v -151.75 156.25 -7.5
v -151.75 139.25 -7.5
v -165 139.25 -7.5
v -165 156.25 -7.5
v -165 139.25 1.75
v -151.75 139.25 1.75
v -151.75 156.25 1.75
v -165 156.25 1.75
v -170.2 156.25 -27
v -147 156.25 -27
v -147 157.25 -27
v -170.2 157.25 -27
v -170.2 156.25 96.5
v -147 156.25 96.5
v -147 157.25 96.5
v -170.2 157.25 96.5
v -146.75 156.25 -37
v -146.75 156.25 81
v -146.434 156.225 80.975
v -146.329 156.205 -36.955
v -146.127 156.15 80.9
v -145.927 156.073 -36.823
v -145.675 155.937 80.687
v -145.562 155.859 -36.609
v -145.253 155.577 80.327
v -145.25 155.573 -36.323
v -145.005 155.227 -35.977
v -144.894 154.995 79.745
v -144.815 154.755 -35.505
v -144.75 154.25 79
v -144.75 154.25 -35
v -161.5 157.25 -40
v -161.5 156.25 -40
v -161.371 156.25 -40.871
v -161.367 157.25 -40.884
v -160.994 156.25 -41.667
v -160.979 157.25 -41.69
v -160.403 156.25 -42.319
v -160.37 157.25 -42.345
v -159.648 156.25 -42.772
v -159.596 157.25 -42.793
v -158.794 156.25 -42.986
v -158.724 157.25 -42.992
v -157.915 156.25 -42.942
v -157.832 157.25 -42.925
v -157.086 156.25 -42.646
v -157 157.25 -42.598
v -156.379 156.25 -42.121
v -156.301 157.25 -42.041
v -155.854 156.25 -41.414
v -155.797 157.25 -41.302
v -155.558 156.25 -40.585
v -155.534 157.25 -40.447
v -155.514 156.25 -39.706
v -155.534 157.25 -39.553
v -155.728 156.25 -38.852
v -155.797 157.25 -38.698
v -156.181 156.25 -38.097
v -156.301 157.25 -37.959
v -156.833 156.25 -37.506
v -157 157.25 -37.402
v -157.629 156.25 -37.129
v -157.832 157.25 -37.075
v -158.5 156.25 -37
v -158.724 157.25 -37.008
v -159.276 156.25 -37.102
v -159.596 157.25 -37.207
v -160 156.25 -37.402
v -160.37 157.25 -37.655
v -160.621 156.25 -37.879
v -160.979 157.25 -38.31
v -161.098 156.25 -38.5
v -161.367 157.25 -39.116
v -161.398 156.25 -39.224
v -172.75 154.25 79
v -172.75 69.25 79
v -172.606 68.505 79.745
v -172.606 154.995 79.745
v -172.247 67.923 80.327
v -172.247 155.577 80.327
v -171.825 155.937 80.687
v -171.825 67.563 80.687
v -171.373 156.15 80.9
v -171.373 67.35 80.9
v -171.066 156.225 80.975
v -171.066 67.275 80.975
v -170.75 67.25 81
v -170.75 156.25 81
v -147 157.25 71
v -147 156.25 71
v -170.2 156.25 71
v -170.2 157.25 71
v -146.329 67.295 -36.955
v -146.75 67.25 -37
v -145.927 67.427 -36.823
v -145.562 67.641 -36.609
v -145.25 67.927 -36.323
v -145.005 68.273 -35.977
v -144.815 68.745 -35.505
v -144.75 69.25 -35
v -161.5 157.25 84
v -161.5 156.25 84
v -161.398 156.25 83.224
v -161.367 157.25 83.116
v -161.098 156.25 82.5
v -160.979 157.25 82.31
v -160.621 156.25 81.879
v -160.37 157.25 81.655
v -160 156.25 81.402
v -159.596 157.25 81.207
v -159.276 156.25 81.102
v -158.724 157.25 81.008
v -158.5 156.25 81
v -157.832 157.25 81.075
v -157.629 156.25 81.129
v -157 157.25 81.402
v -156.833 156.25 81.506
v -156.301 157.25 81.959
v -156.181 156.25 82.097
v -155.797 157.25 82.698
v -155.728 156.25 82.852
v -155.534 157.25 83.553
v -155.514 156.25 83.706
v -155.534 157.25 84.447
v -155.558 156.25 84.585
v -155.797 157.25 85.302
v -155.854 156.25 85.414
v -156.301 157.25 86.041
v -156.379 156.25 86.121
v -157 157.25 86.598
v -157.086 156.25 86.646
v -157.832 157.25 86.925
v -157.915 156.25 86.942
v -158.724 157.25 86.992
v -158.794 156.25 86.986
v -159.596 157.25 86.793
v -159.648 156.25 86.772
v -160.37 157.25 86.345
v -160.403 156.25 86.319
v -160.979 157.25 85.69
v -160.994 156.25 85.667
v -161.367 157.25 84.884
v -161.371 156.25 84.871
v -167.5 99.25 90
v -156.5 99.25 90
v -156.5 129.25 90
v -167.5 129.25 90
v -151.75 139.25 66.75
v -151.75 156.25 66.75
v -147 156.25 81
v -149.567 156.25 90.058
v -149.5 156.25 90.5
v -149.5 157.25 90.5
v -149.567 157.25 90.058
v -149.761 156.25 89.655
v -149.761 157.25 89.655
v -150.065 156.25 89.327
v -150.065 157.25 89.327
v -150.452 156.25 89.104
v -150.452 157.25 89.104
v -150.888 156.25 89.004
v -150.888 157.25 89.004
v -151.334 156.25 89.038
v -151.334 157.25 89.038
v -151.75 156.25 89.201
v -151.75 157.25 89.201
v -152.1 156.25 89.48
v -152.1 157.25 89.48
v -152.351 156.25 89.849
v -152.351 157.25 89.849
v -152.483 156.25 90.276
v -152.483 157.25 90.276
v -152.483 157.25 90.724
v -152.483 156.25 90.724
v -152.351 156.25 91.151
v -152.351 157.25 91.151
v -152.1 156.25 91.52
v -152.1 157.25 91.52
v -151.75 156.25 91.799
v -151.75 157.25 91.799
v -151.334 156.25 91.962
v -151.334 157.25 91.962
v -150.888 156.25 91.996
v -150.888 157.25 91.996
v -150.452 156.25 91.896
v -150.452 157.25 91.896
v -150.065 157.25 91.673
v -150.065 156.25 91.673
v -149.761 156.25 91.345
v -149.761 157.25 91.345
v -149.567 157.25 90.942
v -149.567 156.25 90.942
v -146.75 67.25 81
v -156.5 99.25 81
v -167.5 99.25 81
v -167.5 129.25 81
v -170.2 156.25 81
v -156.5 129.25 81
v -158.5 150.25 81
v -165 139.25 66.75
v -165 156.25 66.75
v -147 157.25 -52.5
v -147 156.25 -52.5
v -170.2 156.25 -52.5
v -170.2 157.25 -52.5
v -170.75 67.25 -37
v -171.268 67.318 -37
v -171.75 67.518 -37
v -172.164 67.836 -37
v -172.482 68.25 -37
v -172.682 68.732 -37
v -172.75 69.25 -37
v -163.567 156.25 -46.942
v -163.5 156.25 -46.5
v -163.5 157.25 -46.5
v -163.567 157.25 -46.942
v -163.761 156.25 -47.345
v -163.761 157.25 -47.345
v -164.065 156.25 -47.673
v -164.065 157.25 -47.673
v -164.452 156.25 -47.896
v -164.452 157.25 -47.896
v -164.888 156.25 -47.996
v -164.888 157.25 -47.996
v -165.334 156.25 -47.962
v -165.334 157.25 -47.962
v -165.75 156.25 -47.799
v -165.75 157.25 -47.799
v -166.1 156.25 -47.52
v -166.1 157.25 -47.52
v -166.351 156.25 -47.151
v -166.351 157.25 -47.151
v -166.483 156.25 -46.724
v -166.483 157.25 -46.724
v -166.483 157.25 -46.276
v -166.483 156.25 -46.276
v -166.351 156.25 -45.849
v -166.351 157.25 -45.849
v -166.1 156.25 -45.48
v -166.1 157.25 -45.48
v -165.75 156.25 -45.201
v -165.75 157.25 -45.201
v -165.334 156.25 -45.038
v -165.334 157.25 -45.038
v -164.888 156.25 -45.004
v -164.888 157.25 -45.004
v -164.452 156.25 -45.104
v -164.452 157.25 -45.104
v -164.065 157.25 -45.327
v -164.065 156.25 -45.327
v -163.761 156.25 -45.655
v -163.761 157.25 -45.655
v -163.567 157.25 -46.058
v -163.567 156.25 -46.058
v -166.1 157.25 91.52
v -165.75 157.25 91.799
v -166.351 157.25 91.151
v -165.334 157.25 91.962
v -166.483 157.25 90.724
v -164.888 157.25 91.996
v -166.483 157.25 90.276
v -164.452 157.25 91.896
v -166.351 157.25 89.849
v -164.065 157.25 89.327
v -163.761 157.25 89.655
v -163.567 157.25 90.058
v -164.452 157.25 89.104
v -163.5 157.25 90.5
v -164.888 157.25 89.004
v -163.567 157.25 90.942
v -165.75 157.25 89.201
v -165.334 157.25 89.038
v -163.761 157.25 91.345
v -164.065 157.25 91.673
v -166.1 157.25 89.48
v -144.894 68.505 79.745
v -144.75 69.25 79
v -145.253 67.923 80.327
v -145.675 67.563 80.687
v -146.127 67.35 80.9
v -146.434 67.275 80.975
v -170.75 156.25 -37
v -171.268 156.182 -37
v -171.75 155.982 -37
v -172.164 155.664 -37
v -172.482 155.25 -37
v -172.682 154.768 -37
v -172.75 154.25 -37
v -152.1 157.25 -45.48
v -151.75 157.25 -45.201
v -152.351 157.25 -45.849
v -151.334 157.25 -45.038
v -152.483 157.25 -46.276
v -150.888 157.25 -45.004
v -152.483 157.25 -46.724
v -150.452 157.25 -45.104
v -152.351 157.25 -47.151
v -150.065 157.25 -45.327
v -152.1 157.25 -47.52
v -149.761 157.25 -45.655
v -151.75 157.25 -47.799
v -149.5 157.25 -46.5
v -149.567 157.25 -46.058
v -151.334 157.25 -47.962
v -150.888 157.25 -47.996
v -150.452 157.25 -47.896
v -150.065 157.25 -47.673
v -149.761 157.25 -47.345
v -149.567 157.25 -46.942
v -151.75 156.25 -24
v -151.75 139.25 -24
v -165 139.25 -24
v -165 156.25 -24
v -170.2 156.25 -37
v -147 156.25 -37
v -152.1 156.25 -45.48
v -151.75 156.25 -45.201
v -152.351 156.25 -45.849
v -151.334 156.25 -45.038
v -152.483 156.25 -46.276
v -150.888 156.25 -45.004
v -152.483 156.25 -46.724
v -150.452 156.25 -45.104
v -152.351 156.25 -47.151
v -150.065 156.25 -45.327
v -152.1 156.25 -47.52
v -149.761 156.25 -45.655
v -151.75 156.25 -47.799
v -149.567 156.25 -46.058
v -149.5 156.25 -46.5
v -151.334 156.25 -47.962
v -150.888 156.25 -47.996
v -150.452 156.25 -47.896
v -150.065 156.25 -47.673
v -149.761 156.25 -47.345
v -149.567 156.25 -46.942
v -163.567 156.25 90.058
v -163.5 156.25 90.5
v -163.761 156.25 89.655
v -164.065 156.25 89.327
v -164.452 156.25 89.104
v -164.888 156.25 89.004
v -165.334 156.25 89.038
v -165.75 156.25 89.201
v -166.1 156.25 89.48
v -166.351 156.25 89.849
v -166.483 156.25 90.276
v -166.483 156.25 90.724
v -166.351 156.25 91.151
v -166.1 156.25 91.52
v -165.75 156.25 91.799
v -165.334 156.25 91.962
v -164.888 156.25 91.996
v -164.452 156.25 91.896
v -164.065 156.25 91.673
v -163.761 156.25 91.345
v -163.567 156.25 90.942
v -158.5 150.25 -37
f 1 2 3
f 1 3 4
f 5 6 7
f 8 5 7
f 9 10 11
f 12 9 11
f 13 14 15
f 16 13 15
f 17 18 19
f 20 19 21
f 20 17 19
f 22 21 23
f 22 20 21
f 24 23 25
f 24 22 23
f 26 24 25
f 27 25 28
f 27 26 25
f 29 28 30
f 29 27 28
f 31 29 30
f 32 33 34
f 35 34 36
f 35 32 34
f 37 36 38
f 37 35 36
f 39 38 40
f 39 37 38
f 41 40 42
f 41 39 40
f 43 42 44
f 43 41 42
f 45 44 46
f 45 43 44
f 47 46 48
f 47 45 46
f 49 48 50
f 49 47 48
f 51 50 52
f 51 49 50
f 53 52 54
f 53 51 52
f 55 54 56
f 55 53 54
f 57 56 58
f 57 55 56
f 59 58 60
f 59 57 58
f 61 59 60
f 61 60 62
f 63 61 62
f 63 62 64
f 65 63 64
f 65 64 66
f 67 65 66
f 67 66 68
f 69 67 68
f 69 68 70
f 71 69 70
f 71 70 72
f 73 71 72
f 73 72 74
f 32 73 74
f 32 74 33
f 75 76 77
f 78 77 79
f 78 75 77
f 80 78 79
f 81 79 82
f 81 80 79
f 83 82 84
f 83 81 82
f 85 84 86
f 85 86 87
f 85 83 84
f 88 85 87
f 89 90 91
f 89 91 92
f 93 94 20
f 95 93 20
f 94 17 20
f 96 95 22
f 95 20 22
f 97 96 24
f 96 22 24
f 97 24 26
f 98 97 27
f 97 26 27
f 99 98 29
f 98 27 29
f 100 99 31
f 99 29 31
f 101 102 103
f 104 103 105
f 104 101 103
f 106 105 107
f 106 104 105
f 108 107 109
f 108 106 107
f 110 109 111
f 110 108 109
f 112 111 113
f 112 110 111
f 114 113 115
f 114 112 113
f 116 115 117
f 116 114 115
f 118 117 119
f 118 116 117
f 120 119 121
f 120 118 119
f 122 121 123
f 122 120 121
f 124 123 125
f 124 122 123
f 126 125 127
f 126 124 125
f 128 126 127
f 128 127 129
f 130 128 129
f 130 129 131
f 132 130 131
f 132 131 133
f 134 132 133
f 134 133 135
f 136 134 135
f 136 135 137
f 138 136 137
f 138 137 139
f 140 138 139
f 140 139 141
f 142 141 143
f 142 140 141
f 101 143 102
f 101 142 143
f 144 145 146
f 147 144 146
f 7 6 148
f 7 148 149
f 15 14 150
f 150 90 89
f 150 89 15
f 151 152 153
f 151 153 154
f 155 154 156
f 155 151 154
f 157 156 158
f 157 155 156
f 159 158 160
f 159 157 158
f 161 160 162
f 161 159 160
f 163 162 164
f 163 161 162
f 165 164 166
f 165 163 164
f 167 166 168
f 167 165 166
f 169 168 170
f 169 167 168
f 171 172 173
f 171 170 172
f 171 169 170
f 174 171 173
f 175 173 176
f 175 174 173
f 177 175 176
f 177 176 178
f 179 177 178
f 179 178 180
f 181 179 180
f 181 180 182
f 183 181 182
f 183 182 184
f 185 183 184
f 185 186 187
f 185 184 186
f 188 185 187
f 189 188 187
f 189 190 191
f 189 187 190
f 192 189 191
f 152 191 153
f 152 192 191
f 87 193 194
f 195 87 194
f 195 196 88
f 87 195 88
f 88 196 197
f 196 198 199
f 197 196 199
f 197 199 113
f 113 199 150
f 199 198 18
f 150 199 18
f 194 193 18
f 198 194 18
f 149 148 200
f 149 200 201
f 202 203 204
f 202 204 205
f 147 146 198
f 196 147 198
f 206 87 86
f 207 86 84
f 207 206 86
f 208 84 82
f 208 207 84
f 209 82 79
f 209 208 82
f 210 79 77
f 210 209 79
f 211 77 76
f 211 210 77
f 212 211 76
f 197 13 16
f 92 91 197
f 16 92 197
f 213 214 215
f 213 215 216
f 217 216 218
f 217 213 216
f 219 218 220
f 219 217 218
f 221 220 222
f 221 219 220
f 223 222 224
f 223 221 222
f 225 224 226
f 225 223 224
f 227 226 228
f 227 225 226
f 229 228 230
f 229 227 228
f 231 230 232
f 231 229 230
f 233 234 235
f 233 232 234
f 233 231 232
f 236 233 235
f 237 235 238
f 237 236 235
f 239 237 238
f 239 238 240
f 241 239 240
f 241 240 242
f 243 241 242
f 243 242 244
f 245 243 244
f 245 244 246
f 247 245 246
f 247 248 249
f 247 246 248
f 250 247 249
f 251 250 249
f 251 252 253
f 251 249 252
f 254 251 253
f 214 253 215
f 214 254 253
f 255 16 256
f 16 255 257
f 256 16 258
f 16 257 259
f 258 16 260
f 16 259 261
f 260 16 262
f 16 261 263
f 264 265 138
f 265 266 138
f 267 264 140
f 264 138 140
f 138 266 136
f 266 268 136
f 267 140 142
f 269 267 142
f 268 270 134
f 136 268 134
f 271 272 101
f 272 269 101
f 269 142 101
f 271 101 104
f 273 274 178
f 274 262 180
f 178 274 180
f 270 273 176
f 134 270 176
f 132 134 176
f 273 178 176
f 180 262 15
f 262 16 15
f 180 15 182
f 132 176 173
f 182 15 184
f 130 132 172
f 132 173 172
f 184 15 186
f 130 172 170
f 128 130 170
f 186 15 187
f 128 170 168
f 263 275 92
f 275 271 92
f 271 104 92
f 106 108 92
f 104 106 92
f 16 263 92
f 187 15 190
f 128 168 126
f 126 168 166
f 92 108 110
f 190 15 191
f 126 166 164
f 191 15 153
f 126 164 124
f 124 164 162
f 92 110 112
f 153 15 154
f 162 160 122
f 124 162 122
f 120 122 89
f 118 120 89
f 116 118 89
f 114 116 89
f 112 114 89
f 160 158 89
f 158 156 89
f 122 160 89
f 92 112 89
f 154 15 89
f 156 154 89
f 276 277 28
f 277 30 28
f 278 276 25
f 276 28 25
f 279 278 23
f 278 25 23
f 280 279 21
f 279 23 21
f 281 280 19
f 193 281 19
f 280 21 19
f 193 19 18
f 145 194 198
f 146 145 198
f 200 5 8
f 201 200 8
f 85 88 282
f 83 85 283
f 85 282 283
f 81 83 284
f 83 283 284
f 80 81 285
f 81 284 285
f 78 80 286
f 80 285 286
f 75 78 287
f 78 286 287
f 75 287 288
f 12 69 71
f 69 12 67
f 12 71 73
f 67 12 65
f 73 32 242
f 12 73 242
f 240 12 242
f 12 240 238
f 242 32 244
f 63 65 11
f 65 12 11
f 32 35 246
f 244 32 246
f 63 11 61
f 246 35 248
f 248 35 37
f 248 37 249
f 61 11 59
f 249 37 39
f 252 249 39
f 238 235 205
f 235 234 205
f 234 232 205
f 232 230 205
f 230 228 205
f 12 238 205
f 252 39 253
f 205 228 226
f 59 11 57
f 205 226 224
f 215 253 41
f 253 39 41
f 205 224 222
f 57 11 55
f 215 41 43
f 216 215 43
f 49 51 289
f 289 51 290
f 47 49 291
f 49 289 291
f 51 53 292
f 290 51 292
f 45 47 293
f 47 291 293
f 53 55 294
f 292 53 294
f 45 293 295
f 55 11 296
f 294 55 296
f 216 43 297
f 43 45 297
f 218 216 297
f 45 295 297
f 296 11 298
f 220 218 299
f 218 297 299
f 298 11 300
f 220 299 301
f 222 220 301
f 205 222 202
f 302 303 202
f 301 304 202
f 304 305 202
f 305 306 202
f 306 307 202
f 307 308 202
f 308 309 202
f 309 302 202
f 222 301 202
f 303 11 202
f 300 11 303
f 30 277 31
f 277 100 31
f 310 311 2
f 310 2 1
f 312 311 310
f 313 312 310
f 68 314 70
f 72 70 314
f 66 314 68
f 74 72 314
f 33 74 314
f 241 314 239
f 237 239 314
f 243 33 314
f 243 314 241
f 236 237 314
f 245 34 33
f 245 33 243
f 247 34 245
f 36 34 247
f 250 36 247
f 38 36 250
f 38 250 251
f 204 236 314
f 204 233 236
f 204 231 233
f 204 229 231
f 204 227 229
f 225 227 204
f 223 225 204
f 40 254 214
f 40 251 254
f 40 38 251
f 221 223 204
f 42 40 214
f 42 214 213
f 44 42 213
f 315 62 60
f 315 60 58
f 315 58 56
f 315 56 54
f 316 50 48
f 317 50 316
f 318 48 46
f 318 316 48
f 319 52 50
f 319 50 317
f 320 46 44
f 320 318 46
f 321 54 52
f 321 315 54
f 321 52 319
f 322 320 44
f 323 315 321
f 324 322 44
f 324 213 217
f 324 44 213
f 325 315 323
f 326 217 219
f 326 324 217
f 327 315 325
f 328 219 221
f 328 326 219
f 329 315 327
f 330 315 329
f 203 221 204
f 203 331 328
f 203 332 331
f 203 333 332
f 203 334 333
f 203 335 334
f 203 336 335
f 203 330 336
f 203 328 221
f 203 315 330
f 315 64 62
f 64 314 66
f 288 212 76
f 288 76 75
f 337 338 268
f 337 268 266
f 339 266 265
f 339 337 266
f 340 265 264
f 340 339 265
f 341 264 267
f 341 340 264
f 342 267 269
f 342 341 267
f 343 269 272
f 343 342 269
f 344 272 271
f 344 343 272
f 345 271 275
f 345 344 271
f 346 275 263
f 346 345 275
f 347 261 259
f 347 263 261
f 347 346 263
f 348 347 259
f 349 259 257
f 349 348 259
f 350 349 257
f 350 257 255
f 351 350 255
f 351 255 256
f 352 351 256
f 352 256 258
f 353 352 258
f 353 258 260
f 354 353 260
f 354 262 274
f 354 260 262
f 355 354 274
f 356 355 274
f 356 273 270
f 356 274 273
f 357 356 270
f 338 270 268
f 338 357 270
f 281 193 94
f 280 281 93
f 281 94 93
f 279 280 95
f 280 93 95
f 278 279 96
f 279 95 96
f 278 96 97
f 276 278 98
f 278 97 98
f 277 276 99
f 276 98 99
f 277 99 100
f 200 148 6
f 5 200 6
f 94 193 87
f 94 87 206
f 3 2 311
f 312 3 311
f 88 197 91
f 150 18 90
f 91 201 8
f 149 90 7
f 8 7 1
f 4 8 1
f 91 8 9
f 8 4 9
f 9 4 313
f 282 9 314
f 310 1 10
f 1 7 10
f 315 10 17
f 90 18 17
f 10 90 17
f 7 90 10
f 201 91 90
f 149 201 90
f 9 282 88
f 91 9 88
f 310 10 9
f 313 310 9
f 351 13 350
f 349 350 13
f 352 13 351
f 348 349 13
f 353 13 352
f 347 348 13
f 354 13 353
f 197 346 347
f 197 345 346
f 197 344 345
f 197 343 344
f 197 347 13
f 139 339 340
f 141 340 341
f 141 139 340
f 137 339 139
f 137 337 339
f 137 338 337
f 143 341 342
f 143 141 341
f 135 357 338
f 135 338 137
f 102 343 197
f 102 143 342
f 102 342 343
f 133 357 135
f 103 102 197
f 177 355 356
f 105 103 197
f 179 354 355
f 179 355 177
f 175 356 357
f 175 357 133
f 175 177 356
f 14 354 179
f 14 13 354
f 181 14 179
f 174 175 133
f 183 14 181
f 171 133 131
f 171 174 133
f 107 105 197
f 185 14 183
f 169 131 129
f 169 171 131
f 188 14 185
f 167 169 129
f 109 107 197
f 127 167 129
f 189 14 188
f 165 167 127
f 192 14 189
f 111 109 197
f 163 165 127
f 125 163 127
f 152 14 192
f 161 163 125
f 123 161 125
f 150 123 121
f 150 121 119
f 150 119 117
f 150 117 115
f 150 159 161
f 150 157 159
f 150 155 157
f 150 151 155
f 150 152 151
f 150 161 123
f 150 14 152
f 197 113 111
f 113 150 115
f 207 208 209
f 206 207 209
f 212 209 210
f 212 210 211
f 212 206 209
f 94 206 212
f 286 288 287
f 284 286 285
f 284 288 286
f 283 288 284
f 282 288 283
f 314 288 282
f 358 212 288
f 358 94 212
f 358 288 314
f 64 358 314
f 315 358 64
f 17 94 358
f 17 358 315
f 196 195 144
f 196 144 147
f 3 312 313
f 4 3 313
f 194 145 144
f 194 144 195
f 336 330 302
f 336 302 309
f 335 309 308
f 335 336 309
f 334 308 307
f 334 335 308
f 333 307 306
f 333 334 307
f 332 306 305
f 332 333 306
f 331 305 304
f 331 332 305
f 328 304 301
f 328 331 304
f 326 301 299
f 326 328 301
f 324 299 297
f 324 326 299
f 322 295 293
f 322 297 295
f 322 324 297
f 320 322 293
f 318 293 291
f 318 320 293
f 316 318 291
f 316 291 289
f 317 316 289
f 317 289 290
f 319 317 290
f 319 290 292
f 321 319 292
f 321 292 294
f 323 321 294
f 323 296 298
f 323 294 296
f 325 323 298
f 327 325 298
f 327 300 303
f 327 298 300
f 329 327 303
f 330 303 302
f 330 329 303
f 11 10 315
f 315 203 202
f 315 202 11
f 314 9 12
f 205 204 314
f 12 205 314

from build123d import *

# Parameters (mm, degrees)
CYLINDER030_R             = 1.5
CYLINDER030_DEPTH         = 10
CYLINDER031_R             = 1.5
CYLINDER031_DEPTH         = 10
CYLINDER032_R             = 1.5
CYLINDER032_DEPTH         = 10
CYLINDER029_R             = 1.5
CYLINDER029_DEPTH         = 10
CYLINDER028_R             = 3
CYLINDER028_DEPTH         = 10
CYLINDER027_R             = 3
CYLINDER027_DEPTH         = 10
BOX036_W                  = 30
BOX036_H                  = 9
BOX036_DEPTH              = 11
BOX037_W                  = 1
BOX037_H                  = 25.5
BOX037_DEPTH              = 23.2
BOX038_W                  = 1
BOX038_H                  = 25.5
BOX038_DEPTH              = 23.2
BOX002_W                  = 17
BOX002_H                  = 16.5
BOX002_DEPTH              = 13.25
BOX035_W                  = 17
BOX035_H                  = 65
BOX035_DEPTH              = 13.25
BOX034_W                  = 89
BOX034_H                  = 118
BOX034_DEPTH              = 28
FILLET022_R               = 2
FILLET022_ROLL_ANGLE      = -90
FILLET022_PLACEMENT_ANGLE = 90


with BuildPart() as cylinder030:
    # Cylinder030 → Cylinder030 (new body)
    with BuildSketch(Plane(origin=(85, -9.5, 20.25), x_dir=(0, 0, -1), z_dir=(1, 0, 0))):
        Circle(CYLINDER030_R)
    extrude(amount=CYLINDER030_DEPTH)


with BuildPart() as cylinder031:
    # Cylinder031 → Cylinder031 (new body)
    with BuildSketch(Plane(origin=(85, 127.5, 6.25), x_dir=(0, 0, -1), z_dir=(1, 0, 0))):
        Circle(CYLINDER031_R)
    extrude(amount=CYLINDER031_DEPTH)


with BuildPart() as cylinder032:
    # Cylinder032 → Cylinder032 (new body)
    with BuildSketch(Plane(origin=(85, 127.5, 20.25), x_dir=(0, 0, -1), z_dir=(1, 0, 0))):
        Circle(CYLINDER032_R)
    extrude(amount=CYLINDER032_DEPTH)


with BuildPart() as mount_small_cyl:
    # Cylinder029 → Cylinder029 (new body)
    with BuildSketch(Plane(origin=(85, -9.5, 6.25), x_dir=(0, 0, -1), z_dir=(1, 0, 0))):
        Circle(CYLINDER029_R)
    extrude(amount=CYLINDER029_DEPTH)

    # Fusion021: union Cylinder030, Cylinder031, Cylinder032
    add(cylinder030.part)
    add(cylinder031.part)
    add(cylinder032.part)


with BuildPart() as cylinder028:
    # Cylinder028 → Cylinder028 (new body)
    with BuildSketch(Plane(origin=(93, 121, 4.5), x_dir=(0, 0, 1), z_dir=(-1, 0, 0))):
        Circle(CYLINDER028_R)
    extrude(amount=CYLINDER028_DEPTH)


with BuildPart() as mount_cyl:
    # Cylinder027 → Cylinder027 (new body)
    with BuildSketch(Plane(origin=(93, -3, 4.5), x_dir=(0, 0, 1), z_dir=(-1, 0, 0))):
        Circle(CYLINDER027_R)
    extrude(amount=CYLINDER027_DEPTH)

    # Fusion020: union Cylinder028
    add(cylinder028.part)


with BuildPart() as mount_cyl_1:
    # Fusion020 placement: moved
    add(mount_cyl.part.moved(Location((0, 0, 9.25))))


with BuildPart() as power:
    # Box036 → Box036 (new body)
    with BuildSketch(Plane(origin=(32, -9, 11.75), x_dir=(1, 0, 0), z_dir=(0, 0, 1))):
        with Locations((15, 4.5)):
            Rectangle(BOX036_W, BOX036_H)
    extrude(amount=BOX036_DEPTH)


with BuildPart() as mount1:
    # Box037 → Box037 (new body)
    with BuildSketch(Plane(origin=(89, -15.5, 2.25), x_dir=(1, 0, 0), z_dir=(0, 0, 1))):
        with Locations((0.5, 12.75)):
            Rectangle(BOX037_W, BOX037_H)
    extrude(amount=BOX037_DEPTH)


with BuildPart() as mount2:
    # Box038 → Box038 (new body)
    with BuildSketch(Plane(origin=(89, 108, 2.25), x_dir=(1, 0, 0), z_dir=(0, 0, 1))):
        with Locations((0.5, 12.75)):
            Rectangle(BOX038_W, BOX038_H)
    extrude(amount=BOX038_DEPTH)


with BuildPart() as cube020:
    # Box002 → Box002 (new body)
    with BuildSketch(Plane(origin=(72, 88.5, 7), x_dir=(1, 0, 0), z_dir=(0, 0, 1))):
        with Locations((8.5, 8.25)):
            Rectangle(BOX002_W, BOX002_H)
    extrude(amount=BOX002_DEPTH)


with BuildPart() as cube019:
    # Box035 → Box035 (new body)
    with BuildSketch(Plane(origin=(72, 14.25, 7), x_dir=(1, 0, 0), z_dir=(0, 0, 1))):
        with Locations((8.5, 32.5)):
            Rectangle(BOX035_W, BOX035_H)
    extrude(amount=BOX035_DEPTH)


with BuildPart() as switch:
    # Box034 → Box034 (new body)
    with BuildSketch(Plane.XY):
        with Locations((44.5, 59)):
            Rectangle(BOX034_W, BOX034_H)
    extrude(amount=BOX034_DEPTH)

    # Cut023: cut Cube019
    add(cube019.part, mode=Mode.SUBTRACT)

    # Cut024: cut Cube020
    add(cube020.part, mode=Mode.SUBTRACT)

    # Fusion019: union Power, mount1, mount2
    add(power.part)
    add(mount1.part)
    add(mount2.part)

    # Cut025: cut mount_cyl
    add(mount_cyl_1.part, mode=Mode.SUBTRACT)

    # Cut026: cut mount_small_cyl
    add(mount_small_cyl.part, mode=Mode.SUBTRACT)

    # Fillet022
    fillet022_edges = [switch.edges().sort_by_distance(p)[0] for p in [
        (44.5, 0, 0),
        (44.5, 0, 28),
        (0, 59, 0),
        (44.5, 118, 0),
        (89, 59, 0),
        (89, 59, 28),
        (0, 59, 28),
    ]]
    fillet(fillet022_edges, radius=FILLET022_R)


with BuildPart() as switch_1:
    # Fillet022 roll: moved
    add(switch.part.rotate(Axis((0, 0, 0), (1, 0, 0)), FILLET022_ROLL_ANGLE))


with BuildPart() as switch_2:
    # Fillet022 placement: moved
    add(switch_1.part.moved(Location((-144.75, 67.25, 81))).rotate(Axis((-144.75, 67.25, 81), (0, 0, 1)), FILLET022_PLACEMENT_ANGLE))


solid = switch_2.part
